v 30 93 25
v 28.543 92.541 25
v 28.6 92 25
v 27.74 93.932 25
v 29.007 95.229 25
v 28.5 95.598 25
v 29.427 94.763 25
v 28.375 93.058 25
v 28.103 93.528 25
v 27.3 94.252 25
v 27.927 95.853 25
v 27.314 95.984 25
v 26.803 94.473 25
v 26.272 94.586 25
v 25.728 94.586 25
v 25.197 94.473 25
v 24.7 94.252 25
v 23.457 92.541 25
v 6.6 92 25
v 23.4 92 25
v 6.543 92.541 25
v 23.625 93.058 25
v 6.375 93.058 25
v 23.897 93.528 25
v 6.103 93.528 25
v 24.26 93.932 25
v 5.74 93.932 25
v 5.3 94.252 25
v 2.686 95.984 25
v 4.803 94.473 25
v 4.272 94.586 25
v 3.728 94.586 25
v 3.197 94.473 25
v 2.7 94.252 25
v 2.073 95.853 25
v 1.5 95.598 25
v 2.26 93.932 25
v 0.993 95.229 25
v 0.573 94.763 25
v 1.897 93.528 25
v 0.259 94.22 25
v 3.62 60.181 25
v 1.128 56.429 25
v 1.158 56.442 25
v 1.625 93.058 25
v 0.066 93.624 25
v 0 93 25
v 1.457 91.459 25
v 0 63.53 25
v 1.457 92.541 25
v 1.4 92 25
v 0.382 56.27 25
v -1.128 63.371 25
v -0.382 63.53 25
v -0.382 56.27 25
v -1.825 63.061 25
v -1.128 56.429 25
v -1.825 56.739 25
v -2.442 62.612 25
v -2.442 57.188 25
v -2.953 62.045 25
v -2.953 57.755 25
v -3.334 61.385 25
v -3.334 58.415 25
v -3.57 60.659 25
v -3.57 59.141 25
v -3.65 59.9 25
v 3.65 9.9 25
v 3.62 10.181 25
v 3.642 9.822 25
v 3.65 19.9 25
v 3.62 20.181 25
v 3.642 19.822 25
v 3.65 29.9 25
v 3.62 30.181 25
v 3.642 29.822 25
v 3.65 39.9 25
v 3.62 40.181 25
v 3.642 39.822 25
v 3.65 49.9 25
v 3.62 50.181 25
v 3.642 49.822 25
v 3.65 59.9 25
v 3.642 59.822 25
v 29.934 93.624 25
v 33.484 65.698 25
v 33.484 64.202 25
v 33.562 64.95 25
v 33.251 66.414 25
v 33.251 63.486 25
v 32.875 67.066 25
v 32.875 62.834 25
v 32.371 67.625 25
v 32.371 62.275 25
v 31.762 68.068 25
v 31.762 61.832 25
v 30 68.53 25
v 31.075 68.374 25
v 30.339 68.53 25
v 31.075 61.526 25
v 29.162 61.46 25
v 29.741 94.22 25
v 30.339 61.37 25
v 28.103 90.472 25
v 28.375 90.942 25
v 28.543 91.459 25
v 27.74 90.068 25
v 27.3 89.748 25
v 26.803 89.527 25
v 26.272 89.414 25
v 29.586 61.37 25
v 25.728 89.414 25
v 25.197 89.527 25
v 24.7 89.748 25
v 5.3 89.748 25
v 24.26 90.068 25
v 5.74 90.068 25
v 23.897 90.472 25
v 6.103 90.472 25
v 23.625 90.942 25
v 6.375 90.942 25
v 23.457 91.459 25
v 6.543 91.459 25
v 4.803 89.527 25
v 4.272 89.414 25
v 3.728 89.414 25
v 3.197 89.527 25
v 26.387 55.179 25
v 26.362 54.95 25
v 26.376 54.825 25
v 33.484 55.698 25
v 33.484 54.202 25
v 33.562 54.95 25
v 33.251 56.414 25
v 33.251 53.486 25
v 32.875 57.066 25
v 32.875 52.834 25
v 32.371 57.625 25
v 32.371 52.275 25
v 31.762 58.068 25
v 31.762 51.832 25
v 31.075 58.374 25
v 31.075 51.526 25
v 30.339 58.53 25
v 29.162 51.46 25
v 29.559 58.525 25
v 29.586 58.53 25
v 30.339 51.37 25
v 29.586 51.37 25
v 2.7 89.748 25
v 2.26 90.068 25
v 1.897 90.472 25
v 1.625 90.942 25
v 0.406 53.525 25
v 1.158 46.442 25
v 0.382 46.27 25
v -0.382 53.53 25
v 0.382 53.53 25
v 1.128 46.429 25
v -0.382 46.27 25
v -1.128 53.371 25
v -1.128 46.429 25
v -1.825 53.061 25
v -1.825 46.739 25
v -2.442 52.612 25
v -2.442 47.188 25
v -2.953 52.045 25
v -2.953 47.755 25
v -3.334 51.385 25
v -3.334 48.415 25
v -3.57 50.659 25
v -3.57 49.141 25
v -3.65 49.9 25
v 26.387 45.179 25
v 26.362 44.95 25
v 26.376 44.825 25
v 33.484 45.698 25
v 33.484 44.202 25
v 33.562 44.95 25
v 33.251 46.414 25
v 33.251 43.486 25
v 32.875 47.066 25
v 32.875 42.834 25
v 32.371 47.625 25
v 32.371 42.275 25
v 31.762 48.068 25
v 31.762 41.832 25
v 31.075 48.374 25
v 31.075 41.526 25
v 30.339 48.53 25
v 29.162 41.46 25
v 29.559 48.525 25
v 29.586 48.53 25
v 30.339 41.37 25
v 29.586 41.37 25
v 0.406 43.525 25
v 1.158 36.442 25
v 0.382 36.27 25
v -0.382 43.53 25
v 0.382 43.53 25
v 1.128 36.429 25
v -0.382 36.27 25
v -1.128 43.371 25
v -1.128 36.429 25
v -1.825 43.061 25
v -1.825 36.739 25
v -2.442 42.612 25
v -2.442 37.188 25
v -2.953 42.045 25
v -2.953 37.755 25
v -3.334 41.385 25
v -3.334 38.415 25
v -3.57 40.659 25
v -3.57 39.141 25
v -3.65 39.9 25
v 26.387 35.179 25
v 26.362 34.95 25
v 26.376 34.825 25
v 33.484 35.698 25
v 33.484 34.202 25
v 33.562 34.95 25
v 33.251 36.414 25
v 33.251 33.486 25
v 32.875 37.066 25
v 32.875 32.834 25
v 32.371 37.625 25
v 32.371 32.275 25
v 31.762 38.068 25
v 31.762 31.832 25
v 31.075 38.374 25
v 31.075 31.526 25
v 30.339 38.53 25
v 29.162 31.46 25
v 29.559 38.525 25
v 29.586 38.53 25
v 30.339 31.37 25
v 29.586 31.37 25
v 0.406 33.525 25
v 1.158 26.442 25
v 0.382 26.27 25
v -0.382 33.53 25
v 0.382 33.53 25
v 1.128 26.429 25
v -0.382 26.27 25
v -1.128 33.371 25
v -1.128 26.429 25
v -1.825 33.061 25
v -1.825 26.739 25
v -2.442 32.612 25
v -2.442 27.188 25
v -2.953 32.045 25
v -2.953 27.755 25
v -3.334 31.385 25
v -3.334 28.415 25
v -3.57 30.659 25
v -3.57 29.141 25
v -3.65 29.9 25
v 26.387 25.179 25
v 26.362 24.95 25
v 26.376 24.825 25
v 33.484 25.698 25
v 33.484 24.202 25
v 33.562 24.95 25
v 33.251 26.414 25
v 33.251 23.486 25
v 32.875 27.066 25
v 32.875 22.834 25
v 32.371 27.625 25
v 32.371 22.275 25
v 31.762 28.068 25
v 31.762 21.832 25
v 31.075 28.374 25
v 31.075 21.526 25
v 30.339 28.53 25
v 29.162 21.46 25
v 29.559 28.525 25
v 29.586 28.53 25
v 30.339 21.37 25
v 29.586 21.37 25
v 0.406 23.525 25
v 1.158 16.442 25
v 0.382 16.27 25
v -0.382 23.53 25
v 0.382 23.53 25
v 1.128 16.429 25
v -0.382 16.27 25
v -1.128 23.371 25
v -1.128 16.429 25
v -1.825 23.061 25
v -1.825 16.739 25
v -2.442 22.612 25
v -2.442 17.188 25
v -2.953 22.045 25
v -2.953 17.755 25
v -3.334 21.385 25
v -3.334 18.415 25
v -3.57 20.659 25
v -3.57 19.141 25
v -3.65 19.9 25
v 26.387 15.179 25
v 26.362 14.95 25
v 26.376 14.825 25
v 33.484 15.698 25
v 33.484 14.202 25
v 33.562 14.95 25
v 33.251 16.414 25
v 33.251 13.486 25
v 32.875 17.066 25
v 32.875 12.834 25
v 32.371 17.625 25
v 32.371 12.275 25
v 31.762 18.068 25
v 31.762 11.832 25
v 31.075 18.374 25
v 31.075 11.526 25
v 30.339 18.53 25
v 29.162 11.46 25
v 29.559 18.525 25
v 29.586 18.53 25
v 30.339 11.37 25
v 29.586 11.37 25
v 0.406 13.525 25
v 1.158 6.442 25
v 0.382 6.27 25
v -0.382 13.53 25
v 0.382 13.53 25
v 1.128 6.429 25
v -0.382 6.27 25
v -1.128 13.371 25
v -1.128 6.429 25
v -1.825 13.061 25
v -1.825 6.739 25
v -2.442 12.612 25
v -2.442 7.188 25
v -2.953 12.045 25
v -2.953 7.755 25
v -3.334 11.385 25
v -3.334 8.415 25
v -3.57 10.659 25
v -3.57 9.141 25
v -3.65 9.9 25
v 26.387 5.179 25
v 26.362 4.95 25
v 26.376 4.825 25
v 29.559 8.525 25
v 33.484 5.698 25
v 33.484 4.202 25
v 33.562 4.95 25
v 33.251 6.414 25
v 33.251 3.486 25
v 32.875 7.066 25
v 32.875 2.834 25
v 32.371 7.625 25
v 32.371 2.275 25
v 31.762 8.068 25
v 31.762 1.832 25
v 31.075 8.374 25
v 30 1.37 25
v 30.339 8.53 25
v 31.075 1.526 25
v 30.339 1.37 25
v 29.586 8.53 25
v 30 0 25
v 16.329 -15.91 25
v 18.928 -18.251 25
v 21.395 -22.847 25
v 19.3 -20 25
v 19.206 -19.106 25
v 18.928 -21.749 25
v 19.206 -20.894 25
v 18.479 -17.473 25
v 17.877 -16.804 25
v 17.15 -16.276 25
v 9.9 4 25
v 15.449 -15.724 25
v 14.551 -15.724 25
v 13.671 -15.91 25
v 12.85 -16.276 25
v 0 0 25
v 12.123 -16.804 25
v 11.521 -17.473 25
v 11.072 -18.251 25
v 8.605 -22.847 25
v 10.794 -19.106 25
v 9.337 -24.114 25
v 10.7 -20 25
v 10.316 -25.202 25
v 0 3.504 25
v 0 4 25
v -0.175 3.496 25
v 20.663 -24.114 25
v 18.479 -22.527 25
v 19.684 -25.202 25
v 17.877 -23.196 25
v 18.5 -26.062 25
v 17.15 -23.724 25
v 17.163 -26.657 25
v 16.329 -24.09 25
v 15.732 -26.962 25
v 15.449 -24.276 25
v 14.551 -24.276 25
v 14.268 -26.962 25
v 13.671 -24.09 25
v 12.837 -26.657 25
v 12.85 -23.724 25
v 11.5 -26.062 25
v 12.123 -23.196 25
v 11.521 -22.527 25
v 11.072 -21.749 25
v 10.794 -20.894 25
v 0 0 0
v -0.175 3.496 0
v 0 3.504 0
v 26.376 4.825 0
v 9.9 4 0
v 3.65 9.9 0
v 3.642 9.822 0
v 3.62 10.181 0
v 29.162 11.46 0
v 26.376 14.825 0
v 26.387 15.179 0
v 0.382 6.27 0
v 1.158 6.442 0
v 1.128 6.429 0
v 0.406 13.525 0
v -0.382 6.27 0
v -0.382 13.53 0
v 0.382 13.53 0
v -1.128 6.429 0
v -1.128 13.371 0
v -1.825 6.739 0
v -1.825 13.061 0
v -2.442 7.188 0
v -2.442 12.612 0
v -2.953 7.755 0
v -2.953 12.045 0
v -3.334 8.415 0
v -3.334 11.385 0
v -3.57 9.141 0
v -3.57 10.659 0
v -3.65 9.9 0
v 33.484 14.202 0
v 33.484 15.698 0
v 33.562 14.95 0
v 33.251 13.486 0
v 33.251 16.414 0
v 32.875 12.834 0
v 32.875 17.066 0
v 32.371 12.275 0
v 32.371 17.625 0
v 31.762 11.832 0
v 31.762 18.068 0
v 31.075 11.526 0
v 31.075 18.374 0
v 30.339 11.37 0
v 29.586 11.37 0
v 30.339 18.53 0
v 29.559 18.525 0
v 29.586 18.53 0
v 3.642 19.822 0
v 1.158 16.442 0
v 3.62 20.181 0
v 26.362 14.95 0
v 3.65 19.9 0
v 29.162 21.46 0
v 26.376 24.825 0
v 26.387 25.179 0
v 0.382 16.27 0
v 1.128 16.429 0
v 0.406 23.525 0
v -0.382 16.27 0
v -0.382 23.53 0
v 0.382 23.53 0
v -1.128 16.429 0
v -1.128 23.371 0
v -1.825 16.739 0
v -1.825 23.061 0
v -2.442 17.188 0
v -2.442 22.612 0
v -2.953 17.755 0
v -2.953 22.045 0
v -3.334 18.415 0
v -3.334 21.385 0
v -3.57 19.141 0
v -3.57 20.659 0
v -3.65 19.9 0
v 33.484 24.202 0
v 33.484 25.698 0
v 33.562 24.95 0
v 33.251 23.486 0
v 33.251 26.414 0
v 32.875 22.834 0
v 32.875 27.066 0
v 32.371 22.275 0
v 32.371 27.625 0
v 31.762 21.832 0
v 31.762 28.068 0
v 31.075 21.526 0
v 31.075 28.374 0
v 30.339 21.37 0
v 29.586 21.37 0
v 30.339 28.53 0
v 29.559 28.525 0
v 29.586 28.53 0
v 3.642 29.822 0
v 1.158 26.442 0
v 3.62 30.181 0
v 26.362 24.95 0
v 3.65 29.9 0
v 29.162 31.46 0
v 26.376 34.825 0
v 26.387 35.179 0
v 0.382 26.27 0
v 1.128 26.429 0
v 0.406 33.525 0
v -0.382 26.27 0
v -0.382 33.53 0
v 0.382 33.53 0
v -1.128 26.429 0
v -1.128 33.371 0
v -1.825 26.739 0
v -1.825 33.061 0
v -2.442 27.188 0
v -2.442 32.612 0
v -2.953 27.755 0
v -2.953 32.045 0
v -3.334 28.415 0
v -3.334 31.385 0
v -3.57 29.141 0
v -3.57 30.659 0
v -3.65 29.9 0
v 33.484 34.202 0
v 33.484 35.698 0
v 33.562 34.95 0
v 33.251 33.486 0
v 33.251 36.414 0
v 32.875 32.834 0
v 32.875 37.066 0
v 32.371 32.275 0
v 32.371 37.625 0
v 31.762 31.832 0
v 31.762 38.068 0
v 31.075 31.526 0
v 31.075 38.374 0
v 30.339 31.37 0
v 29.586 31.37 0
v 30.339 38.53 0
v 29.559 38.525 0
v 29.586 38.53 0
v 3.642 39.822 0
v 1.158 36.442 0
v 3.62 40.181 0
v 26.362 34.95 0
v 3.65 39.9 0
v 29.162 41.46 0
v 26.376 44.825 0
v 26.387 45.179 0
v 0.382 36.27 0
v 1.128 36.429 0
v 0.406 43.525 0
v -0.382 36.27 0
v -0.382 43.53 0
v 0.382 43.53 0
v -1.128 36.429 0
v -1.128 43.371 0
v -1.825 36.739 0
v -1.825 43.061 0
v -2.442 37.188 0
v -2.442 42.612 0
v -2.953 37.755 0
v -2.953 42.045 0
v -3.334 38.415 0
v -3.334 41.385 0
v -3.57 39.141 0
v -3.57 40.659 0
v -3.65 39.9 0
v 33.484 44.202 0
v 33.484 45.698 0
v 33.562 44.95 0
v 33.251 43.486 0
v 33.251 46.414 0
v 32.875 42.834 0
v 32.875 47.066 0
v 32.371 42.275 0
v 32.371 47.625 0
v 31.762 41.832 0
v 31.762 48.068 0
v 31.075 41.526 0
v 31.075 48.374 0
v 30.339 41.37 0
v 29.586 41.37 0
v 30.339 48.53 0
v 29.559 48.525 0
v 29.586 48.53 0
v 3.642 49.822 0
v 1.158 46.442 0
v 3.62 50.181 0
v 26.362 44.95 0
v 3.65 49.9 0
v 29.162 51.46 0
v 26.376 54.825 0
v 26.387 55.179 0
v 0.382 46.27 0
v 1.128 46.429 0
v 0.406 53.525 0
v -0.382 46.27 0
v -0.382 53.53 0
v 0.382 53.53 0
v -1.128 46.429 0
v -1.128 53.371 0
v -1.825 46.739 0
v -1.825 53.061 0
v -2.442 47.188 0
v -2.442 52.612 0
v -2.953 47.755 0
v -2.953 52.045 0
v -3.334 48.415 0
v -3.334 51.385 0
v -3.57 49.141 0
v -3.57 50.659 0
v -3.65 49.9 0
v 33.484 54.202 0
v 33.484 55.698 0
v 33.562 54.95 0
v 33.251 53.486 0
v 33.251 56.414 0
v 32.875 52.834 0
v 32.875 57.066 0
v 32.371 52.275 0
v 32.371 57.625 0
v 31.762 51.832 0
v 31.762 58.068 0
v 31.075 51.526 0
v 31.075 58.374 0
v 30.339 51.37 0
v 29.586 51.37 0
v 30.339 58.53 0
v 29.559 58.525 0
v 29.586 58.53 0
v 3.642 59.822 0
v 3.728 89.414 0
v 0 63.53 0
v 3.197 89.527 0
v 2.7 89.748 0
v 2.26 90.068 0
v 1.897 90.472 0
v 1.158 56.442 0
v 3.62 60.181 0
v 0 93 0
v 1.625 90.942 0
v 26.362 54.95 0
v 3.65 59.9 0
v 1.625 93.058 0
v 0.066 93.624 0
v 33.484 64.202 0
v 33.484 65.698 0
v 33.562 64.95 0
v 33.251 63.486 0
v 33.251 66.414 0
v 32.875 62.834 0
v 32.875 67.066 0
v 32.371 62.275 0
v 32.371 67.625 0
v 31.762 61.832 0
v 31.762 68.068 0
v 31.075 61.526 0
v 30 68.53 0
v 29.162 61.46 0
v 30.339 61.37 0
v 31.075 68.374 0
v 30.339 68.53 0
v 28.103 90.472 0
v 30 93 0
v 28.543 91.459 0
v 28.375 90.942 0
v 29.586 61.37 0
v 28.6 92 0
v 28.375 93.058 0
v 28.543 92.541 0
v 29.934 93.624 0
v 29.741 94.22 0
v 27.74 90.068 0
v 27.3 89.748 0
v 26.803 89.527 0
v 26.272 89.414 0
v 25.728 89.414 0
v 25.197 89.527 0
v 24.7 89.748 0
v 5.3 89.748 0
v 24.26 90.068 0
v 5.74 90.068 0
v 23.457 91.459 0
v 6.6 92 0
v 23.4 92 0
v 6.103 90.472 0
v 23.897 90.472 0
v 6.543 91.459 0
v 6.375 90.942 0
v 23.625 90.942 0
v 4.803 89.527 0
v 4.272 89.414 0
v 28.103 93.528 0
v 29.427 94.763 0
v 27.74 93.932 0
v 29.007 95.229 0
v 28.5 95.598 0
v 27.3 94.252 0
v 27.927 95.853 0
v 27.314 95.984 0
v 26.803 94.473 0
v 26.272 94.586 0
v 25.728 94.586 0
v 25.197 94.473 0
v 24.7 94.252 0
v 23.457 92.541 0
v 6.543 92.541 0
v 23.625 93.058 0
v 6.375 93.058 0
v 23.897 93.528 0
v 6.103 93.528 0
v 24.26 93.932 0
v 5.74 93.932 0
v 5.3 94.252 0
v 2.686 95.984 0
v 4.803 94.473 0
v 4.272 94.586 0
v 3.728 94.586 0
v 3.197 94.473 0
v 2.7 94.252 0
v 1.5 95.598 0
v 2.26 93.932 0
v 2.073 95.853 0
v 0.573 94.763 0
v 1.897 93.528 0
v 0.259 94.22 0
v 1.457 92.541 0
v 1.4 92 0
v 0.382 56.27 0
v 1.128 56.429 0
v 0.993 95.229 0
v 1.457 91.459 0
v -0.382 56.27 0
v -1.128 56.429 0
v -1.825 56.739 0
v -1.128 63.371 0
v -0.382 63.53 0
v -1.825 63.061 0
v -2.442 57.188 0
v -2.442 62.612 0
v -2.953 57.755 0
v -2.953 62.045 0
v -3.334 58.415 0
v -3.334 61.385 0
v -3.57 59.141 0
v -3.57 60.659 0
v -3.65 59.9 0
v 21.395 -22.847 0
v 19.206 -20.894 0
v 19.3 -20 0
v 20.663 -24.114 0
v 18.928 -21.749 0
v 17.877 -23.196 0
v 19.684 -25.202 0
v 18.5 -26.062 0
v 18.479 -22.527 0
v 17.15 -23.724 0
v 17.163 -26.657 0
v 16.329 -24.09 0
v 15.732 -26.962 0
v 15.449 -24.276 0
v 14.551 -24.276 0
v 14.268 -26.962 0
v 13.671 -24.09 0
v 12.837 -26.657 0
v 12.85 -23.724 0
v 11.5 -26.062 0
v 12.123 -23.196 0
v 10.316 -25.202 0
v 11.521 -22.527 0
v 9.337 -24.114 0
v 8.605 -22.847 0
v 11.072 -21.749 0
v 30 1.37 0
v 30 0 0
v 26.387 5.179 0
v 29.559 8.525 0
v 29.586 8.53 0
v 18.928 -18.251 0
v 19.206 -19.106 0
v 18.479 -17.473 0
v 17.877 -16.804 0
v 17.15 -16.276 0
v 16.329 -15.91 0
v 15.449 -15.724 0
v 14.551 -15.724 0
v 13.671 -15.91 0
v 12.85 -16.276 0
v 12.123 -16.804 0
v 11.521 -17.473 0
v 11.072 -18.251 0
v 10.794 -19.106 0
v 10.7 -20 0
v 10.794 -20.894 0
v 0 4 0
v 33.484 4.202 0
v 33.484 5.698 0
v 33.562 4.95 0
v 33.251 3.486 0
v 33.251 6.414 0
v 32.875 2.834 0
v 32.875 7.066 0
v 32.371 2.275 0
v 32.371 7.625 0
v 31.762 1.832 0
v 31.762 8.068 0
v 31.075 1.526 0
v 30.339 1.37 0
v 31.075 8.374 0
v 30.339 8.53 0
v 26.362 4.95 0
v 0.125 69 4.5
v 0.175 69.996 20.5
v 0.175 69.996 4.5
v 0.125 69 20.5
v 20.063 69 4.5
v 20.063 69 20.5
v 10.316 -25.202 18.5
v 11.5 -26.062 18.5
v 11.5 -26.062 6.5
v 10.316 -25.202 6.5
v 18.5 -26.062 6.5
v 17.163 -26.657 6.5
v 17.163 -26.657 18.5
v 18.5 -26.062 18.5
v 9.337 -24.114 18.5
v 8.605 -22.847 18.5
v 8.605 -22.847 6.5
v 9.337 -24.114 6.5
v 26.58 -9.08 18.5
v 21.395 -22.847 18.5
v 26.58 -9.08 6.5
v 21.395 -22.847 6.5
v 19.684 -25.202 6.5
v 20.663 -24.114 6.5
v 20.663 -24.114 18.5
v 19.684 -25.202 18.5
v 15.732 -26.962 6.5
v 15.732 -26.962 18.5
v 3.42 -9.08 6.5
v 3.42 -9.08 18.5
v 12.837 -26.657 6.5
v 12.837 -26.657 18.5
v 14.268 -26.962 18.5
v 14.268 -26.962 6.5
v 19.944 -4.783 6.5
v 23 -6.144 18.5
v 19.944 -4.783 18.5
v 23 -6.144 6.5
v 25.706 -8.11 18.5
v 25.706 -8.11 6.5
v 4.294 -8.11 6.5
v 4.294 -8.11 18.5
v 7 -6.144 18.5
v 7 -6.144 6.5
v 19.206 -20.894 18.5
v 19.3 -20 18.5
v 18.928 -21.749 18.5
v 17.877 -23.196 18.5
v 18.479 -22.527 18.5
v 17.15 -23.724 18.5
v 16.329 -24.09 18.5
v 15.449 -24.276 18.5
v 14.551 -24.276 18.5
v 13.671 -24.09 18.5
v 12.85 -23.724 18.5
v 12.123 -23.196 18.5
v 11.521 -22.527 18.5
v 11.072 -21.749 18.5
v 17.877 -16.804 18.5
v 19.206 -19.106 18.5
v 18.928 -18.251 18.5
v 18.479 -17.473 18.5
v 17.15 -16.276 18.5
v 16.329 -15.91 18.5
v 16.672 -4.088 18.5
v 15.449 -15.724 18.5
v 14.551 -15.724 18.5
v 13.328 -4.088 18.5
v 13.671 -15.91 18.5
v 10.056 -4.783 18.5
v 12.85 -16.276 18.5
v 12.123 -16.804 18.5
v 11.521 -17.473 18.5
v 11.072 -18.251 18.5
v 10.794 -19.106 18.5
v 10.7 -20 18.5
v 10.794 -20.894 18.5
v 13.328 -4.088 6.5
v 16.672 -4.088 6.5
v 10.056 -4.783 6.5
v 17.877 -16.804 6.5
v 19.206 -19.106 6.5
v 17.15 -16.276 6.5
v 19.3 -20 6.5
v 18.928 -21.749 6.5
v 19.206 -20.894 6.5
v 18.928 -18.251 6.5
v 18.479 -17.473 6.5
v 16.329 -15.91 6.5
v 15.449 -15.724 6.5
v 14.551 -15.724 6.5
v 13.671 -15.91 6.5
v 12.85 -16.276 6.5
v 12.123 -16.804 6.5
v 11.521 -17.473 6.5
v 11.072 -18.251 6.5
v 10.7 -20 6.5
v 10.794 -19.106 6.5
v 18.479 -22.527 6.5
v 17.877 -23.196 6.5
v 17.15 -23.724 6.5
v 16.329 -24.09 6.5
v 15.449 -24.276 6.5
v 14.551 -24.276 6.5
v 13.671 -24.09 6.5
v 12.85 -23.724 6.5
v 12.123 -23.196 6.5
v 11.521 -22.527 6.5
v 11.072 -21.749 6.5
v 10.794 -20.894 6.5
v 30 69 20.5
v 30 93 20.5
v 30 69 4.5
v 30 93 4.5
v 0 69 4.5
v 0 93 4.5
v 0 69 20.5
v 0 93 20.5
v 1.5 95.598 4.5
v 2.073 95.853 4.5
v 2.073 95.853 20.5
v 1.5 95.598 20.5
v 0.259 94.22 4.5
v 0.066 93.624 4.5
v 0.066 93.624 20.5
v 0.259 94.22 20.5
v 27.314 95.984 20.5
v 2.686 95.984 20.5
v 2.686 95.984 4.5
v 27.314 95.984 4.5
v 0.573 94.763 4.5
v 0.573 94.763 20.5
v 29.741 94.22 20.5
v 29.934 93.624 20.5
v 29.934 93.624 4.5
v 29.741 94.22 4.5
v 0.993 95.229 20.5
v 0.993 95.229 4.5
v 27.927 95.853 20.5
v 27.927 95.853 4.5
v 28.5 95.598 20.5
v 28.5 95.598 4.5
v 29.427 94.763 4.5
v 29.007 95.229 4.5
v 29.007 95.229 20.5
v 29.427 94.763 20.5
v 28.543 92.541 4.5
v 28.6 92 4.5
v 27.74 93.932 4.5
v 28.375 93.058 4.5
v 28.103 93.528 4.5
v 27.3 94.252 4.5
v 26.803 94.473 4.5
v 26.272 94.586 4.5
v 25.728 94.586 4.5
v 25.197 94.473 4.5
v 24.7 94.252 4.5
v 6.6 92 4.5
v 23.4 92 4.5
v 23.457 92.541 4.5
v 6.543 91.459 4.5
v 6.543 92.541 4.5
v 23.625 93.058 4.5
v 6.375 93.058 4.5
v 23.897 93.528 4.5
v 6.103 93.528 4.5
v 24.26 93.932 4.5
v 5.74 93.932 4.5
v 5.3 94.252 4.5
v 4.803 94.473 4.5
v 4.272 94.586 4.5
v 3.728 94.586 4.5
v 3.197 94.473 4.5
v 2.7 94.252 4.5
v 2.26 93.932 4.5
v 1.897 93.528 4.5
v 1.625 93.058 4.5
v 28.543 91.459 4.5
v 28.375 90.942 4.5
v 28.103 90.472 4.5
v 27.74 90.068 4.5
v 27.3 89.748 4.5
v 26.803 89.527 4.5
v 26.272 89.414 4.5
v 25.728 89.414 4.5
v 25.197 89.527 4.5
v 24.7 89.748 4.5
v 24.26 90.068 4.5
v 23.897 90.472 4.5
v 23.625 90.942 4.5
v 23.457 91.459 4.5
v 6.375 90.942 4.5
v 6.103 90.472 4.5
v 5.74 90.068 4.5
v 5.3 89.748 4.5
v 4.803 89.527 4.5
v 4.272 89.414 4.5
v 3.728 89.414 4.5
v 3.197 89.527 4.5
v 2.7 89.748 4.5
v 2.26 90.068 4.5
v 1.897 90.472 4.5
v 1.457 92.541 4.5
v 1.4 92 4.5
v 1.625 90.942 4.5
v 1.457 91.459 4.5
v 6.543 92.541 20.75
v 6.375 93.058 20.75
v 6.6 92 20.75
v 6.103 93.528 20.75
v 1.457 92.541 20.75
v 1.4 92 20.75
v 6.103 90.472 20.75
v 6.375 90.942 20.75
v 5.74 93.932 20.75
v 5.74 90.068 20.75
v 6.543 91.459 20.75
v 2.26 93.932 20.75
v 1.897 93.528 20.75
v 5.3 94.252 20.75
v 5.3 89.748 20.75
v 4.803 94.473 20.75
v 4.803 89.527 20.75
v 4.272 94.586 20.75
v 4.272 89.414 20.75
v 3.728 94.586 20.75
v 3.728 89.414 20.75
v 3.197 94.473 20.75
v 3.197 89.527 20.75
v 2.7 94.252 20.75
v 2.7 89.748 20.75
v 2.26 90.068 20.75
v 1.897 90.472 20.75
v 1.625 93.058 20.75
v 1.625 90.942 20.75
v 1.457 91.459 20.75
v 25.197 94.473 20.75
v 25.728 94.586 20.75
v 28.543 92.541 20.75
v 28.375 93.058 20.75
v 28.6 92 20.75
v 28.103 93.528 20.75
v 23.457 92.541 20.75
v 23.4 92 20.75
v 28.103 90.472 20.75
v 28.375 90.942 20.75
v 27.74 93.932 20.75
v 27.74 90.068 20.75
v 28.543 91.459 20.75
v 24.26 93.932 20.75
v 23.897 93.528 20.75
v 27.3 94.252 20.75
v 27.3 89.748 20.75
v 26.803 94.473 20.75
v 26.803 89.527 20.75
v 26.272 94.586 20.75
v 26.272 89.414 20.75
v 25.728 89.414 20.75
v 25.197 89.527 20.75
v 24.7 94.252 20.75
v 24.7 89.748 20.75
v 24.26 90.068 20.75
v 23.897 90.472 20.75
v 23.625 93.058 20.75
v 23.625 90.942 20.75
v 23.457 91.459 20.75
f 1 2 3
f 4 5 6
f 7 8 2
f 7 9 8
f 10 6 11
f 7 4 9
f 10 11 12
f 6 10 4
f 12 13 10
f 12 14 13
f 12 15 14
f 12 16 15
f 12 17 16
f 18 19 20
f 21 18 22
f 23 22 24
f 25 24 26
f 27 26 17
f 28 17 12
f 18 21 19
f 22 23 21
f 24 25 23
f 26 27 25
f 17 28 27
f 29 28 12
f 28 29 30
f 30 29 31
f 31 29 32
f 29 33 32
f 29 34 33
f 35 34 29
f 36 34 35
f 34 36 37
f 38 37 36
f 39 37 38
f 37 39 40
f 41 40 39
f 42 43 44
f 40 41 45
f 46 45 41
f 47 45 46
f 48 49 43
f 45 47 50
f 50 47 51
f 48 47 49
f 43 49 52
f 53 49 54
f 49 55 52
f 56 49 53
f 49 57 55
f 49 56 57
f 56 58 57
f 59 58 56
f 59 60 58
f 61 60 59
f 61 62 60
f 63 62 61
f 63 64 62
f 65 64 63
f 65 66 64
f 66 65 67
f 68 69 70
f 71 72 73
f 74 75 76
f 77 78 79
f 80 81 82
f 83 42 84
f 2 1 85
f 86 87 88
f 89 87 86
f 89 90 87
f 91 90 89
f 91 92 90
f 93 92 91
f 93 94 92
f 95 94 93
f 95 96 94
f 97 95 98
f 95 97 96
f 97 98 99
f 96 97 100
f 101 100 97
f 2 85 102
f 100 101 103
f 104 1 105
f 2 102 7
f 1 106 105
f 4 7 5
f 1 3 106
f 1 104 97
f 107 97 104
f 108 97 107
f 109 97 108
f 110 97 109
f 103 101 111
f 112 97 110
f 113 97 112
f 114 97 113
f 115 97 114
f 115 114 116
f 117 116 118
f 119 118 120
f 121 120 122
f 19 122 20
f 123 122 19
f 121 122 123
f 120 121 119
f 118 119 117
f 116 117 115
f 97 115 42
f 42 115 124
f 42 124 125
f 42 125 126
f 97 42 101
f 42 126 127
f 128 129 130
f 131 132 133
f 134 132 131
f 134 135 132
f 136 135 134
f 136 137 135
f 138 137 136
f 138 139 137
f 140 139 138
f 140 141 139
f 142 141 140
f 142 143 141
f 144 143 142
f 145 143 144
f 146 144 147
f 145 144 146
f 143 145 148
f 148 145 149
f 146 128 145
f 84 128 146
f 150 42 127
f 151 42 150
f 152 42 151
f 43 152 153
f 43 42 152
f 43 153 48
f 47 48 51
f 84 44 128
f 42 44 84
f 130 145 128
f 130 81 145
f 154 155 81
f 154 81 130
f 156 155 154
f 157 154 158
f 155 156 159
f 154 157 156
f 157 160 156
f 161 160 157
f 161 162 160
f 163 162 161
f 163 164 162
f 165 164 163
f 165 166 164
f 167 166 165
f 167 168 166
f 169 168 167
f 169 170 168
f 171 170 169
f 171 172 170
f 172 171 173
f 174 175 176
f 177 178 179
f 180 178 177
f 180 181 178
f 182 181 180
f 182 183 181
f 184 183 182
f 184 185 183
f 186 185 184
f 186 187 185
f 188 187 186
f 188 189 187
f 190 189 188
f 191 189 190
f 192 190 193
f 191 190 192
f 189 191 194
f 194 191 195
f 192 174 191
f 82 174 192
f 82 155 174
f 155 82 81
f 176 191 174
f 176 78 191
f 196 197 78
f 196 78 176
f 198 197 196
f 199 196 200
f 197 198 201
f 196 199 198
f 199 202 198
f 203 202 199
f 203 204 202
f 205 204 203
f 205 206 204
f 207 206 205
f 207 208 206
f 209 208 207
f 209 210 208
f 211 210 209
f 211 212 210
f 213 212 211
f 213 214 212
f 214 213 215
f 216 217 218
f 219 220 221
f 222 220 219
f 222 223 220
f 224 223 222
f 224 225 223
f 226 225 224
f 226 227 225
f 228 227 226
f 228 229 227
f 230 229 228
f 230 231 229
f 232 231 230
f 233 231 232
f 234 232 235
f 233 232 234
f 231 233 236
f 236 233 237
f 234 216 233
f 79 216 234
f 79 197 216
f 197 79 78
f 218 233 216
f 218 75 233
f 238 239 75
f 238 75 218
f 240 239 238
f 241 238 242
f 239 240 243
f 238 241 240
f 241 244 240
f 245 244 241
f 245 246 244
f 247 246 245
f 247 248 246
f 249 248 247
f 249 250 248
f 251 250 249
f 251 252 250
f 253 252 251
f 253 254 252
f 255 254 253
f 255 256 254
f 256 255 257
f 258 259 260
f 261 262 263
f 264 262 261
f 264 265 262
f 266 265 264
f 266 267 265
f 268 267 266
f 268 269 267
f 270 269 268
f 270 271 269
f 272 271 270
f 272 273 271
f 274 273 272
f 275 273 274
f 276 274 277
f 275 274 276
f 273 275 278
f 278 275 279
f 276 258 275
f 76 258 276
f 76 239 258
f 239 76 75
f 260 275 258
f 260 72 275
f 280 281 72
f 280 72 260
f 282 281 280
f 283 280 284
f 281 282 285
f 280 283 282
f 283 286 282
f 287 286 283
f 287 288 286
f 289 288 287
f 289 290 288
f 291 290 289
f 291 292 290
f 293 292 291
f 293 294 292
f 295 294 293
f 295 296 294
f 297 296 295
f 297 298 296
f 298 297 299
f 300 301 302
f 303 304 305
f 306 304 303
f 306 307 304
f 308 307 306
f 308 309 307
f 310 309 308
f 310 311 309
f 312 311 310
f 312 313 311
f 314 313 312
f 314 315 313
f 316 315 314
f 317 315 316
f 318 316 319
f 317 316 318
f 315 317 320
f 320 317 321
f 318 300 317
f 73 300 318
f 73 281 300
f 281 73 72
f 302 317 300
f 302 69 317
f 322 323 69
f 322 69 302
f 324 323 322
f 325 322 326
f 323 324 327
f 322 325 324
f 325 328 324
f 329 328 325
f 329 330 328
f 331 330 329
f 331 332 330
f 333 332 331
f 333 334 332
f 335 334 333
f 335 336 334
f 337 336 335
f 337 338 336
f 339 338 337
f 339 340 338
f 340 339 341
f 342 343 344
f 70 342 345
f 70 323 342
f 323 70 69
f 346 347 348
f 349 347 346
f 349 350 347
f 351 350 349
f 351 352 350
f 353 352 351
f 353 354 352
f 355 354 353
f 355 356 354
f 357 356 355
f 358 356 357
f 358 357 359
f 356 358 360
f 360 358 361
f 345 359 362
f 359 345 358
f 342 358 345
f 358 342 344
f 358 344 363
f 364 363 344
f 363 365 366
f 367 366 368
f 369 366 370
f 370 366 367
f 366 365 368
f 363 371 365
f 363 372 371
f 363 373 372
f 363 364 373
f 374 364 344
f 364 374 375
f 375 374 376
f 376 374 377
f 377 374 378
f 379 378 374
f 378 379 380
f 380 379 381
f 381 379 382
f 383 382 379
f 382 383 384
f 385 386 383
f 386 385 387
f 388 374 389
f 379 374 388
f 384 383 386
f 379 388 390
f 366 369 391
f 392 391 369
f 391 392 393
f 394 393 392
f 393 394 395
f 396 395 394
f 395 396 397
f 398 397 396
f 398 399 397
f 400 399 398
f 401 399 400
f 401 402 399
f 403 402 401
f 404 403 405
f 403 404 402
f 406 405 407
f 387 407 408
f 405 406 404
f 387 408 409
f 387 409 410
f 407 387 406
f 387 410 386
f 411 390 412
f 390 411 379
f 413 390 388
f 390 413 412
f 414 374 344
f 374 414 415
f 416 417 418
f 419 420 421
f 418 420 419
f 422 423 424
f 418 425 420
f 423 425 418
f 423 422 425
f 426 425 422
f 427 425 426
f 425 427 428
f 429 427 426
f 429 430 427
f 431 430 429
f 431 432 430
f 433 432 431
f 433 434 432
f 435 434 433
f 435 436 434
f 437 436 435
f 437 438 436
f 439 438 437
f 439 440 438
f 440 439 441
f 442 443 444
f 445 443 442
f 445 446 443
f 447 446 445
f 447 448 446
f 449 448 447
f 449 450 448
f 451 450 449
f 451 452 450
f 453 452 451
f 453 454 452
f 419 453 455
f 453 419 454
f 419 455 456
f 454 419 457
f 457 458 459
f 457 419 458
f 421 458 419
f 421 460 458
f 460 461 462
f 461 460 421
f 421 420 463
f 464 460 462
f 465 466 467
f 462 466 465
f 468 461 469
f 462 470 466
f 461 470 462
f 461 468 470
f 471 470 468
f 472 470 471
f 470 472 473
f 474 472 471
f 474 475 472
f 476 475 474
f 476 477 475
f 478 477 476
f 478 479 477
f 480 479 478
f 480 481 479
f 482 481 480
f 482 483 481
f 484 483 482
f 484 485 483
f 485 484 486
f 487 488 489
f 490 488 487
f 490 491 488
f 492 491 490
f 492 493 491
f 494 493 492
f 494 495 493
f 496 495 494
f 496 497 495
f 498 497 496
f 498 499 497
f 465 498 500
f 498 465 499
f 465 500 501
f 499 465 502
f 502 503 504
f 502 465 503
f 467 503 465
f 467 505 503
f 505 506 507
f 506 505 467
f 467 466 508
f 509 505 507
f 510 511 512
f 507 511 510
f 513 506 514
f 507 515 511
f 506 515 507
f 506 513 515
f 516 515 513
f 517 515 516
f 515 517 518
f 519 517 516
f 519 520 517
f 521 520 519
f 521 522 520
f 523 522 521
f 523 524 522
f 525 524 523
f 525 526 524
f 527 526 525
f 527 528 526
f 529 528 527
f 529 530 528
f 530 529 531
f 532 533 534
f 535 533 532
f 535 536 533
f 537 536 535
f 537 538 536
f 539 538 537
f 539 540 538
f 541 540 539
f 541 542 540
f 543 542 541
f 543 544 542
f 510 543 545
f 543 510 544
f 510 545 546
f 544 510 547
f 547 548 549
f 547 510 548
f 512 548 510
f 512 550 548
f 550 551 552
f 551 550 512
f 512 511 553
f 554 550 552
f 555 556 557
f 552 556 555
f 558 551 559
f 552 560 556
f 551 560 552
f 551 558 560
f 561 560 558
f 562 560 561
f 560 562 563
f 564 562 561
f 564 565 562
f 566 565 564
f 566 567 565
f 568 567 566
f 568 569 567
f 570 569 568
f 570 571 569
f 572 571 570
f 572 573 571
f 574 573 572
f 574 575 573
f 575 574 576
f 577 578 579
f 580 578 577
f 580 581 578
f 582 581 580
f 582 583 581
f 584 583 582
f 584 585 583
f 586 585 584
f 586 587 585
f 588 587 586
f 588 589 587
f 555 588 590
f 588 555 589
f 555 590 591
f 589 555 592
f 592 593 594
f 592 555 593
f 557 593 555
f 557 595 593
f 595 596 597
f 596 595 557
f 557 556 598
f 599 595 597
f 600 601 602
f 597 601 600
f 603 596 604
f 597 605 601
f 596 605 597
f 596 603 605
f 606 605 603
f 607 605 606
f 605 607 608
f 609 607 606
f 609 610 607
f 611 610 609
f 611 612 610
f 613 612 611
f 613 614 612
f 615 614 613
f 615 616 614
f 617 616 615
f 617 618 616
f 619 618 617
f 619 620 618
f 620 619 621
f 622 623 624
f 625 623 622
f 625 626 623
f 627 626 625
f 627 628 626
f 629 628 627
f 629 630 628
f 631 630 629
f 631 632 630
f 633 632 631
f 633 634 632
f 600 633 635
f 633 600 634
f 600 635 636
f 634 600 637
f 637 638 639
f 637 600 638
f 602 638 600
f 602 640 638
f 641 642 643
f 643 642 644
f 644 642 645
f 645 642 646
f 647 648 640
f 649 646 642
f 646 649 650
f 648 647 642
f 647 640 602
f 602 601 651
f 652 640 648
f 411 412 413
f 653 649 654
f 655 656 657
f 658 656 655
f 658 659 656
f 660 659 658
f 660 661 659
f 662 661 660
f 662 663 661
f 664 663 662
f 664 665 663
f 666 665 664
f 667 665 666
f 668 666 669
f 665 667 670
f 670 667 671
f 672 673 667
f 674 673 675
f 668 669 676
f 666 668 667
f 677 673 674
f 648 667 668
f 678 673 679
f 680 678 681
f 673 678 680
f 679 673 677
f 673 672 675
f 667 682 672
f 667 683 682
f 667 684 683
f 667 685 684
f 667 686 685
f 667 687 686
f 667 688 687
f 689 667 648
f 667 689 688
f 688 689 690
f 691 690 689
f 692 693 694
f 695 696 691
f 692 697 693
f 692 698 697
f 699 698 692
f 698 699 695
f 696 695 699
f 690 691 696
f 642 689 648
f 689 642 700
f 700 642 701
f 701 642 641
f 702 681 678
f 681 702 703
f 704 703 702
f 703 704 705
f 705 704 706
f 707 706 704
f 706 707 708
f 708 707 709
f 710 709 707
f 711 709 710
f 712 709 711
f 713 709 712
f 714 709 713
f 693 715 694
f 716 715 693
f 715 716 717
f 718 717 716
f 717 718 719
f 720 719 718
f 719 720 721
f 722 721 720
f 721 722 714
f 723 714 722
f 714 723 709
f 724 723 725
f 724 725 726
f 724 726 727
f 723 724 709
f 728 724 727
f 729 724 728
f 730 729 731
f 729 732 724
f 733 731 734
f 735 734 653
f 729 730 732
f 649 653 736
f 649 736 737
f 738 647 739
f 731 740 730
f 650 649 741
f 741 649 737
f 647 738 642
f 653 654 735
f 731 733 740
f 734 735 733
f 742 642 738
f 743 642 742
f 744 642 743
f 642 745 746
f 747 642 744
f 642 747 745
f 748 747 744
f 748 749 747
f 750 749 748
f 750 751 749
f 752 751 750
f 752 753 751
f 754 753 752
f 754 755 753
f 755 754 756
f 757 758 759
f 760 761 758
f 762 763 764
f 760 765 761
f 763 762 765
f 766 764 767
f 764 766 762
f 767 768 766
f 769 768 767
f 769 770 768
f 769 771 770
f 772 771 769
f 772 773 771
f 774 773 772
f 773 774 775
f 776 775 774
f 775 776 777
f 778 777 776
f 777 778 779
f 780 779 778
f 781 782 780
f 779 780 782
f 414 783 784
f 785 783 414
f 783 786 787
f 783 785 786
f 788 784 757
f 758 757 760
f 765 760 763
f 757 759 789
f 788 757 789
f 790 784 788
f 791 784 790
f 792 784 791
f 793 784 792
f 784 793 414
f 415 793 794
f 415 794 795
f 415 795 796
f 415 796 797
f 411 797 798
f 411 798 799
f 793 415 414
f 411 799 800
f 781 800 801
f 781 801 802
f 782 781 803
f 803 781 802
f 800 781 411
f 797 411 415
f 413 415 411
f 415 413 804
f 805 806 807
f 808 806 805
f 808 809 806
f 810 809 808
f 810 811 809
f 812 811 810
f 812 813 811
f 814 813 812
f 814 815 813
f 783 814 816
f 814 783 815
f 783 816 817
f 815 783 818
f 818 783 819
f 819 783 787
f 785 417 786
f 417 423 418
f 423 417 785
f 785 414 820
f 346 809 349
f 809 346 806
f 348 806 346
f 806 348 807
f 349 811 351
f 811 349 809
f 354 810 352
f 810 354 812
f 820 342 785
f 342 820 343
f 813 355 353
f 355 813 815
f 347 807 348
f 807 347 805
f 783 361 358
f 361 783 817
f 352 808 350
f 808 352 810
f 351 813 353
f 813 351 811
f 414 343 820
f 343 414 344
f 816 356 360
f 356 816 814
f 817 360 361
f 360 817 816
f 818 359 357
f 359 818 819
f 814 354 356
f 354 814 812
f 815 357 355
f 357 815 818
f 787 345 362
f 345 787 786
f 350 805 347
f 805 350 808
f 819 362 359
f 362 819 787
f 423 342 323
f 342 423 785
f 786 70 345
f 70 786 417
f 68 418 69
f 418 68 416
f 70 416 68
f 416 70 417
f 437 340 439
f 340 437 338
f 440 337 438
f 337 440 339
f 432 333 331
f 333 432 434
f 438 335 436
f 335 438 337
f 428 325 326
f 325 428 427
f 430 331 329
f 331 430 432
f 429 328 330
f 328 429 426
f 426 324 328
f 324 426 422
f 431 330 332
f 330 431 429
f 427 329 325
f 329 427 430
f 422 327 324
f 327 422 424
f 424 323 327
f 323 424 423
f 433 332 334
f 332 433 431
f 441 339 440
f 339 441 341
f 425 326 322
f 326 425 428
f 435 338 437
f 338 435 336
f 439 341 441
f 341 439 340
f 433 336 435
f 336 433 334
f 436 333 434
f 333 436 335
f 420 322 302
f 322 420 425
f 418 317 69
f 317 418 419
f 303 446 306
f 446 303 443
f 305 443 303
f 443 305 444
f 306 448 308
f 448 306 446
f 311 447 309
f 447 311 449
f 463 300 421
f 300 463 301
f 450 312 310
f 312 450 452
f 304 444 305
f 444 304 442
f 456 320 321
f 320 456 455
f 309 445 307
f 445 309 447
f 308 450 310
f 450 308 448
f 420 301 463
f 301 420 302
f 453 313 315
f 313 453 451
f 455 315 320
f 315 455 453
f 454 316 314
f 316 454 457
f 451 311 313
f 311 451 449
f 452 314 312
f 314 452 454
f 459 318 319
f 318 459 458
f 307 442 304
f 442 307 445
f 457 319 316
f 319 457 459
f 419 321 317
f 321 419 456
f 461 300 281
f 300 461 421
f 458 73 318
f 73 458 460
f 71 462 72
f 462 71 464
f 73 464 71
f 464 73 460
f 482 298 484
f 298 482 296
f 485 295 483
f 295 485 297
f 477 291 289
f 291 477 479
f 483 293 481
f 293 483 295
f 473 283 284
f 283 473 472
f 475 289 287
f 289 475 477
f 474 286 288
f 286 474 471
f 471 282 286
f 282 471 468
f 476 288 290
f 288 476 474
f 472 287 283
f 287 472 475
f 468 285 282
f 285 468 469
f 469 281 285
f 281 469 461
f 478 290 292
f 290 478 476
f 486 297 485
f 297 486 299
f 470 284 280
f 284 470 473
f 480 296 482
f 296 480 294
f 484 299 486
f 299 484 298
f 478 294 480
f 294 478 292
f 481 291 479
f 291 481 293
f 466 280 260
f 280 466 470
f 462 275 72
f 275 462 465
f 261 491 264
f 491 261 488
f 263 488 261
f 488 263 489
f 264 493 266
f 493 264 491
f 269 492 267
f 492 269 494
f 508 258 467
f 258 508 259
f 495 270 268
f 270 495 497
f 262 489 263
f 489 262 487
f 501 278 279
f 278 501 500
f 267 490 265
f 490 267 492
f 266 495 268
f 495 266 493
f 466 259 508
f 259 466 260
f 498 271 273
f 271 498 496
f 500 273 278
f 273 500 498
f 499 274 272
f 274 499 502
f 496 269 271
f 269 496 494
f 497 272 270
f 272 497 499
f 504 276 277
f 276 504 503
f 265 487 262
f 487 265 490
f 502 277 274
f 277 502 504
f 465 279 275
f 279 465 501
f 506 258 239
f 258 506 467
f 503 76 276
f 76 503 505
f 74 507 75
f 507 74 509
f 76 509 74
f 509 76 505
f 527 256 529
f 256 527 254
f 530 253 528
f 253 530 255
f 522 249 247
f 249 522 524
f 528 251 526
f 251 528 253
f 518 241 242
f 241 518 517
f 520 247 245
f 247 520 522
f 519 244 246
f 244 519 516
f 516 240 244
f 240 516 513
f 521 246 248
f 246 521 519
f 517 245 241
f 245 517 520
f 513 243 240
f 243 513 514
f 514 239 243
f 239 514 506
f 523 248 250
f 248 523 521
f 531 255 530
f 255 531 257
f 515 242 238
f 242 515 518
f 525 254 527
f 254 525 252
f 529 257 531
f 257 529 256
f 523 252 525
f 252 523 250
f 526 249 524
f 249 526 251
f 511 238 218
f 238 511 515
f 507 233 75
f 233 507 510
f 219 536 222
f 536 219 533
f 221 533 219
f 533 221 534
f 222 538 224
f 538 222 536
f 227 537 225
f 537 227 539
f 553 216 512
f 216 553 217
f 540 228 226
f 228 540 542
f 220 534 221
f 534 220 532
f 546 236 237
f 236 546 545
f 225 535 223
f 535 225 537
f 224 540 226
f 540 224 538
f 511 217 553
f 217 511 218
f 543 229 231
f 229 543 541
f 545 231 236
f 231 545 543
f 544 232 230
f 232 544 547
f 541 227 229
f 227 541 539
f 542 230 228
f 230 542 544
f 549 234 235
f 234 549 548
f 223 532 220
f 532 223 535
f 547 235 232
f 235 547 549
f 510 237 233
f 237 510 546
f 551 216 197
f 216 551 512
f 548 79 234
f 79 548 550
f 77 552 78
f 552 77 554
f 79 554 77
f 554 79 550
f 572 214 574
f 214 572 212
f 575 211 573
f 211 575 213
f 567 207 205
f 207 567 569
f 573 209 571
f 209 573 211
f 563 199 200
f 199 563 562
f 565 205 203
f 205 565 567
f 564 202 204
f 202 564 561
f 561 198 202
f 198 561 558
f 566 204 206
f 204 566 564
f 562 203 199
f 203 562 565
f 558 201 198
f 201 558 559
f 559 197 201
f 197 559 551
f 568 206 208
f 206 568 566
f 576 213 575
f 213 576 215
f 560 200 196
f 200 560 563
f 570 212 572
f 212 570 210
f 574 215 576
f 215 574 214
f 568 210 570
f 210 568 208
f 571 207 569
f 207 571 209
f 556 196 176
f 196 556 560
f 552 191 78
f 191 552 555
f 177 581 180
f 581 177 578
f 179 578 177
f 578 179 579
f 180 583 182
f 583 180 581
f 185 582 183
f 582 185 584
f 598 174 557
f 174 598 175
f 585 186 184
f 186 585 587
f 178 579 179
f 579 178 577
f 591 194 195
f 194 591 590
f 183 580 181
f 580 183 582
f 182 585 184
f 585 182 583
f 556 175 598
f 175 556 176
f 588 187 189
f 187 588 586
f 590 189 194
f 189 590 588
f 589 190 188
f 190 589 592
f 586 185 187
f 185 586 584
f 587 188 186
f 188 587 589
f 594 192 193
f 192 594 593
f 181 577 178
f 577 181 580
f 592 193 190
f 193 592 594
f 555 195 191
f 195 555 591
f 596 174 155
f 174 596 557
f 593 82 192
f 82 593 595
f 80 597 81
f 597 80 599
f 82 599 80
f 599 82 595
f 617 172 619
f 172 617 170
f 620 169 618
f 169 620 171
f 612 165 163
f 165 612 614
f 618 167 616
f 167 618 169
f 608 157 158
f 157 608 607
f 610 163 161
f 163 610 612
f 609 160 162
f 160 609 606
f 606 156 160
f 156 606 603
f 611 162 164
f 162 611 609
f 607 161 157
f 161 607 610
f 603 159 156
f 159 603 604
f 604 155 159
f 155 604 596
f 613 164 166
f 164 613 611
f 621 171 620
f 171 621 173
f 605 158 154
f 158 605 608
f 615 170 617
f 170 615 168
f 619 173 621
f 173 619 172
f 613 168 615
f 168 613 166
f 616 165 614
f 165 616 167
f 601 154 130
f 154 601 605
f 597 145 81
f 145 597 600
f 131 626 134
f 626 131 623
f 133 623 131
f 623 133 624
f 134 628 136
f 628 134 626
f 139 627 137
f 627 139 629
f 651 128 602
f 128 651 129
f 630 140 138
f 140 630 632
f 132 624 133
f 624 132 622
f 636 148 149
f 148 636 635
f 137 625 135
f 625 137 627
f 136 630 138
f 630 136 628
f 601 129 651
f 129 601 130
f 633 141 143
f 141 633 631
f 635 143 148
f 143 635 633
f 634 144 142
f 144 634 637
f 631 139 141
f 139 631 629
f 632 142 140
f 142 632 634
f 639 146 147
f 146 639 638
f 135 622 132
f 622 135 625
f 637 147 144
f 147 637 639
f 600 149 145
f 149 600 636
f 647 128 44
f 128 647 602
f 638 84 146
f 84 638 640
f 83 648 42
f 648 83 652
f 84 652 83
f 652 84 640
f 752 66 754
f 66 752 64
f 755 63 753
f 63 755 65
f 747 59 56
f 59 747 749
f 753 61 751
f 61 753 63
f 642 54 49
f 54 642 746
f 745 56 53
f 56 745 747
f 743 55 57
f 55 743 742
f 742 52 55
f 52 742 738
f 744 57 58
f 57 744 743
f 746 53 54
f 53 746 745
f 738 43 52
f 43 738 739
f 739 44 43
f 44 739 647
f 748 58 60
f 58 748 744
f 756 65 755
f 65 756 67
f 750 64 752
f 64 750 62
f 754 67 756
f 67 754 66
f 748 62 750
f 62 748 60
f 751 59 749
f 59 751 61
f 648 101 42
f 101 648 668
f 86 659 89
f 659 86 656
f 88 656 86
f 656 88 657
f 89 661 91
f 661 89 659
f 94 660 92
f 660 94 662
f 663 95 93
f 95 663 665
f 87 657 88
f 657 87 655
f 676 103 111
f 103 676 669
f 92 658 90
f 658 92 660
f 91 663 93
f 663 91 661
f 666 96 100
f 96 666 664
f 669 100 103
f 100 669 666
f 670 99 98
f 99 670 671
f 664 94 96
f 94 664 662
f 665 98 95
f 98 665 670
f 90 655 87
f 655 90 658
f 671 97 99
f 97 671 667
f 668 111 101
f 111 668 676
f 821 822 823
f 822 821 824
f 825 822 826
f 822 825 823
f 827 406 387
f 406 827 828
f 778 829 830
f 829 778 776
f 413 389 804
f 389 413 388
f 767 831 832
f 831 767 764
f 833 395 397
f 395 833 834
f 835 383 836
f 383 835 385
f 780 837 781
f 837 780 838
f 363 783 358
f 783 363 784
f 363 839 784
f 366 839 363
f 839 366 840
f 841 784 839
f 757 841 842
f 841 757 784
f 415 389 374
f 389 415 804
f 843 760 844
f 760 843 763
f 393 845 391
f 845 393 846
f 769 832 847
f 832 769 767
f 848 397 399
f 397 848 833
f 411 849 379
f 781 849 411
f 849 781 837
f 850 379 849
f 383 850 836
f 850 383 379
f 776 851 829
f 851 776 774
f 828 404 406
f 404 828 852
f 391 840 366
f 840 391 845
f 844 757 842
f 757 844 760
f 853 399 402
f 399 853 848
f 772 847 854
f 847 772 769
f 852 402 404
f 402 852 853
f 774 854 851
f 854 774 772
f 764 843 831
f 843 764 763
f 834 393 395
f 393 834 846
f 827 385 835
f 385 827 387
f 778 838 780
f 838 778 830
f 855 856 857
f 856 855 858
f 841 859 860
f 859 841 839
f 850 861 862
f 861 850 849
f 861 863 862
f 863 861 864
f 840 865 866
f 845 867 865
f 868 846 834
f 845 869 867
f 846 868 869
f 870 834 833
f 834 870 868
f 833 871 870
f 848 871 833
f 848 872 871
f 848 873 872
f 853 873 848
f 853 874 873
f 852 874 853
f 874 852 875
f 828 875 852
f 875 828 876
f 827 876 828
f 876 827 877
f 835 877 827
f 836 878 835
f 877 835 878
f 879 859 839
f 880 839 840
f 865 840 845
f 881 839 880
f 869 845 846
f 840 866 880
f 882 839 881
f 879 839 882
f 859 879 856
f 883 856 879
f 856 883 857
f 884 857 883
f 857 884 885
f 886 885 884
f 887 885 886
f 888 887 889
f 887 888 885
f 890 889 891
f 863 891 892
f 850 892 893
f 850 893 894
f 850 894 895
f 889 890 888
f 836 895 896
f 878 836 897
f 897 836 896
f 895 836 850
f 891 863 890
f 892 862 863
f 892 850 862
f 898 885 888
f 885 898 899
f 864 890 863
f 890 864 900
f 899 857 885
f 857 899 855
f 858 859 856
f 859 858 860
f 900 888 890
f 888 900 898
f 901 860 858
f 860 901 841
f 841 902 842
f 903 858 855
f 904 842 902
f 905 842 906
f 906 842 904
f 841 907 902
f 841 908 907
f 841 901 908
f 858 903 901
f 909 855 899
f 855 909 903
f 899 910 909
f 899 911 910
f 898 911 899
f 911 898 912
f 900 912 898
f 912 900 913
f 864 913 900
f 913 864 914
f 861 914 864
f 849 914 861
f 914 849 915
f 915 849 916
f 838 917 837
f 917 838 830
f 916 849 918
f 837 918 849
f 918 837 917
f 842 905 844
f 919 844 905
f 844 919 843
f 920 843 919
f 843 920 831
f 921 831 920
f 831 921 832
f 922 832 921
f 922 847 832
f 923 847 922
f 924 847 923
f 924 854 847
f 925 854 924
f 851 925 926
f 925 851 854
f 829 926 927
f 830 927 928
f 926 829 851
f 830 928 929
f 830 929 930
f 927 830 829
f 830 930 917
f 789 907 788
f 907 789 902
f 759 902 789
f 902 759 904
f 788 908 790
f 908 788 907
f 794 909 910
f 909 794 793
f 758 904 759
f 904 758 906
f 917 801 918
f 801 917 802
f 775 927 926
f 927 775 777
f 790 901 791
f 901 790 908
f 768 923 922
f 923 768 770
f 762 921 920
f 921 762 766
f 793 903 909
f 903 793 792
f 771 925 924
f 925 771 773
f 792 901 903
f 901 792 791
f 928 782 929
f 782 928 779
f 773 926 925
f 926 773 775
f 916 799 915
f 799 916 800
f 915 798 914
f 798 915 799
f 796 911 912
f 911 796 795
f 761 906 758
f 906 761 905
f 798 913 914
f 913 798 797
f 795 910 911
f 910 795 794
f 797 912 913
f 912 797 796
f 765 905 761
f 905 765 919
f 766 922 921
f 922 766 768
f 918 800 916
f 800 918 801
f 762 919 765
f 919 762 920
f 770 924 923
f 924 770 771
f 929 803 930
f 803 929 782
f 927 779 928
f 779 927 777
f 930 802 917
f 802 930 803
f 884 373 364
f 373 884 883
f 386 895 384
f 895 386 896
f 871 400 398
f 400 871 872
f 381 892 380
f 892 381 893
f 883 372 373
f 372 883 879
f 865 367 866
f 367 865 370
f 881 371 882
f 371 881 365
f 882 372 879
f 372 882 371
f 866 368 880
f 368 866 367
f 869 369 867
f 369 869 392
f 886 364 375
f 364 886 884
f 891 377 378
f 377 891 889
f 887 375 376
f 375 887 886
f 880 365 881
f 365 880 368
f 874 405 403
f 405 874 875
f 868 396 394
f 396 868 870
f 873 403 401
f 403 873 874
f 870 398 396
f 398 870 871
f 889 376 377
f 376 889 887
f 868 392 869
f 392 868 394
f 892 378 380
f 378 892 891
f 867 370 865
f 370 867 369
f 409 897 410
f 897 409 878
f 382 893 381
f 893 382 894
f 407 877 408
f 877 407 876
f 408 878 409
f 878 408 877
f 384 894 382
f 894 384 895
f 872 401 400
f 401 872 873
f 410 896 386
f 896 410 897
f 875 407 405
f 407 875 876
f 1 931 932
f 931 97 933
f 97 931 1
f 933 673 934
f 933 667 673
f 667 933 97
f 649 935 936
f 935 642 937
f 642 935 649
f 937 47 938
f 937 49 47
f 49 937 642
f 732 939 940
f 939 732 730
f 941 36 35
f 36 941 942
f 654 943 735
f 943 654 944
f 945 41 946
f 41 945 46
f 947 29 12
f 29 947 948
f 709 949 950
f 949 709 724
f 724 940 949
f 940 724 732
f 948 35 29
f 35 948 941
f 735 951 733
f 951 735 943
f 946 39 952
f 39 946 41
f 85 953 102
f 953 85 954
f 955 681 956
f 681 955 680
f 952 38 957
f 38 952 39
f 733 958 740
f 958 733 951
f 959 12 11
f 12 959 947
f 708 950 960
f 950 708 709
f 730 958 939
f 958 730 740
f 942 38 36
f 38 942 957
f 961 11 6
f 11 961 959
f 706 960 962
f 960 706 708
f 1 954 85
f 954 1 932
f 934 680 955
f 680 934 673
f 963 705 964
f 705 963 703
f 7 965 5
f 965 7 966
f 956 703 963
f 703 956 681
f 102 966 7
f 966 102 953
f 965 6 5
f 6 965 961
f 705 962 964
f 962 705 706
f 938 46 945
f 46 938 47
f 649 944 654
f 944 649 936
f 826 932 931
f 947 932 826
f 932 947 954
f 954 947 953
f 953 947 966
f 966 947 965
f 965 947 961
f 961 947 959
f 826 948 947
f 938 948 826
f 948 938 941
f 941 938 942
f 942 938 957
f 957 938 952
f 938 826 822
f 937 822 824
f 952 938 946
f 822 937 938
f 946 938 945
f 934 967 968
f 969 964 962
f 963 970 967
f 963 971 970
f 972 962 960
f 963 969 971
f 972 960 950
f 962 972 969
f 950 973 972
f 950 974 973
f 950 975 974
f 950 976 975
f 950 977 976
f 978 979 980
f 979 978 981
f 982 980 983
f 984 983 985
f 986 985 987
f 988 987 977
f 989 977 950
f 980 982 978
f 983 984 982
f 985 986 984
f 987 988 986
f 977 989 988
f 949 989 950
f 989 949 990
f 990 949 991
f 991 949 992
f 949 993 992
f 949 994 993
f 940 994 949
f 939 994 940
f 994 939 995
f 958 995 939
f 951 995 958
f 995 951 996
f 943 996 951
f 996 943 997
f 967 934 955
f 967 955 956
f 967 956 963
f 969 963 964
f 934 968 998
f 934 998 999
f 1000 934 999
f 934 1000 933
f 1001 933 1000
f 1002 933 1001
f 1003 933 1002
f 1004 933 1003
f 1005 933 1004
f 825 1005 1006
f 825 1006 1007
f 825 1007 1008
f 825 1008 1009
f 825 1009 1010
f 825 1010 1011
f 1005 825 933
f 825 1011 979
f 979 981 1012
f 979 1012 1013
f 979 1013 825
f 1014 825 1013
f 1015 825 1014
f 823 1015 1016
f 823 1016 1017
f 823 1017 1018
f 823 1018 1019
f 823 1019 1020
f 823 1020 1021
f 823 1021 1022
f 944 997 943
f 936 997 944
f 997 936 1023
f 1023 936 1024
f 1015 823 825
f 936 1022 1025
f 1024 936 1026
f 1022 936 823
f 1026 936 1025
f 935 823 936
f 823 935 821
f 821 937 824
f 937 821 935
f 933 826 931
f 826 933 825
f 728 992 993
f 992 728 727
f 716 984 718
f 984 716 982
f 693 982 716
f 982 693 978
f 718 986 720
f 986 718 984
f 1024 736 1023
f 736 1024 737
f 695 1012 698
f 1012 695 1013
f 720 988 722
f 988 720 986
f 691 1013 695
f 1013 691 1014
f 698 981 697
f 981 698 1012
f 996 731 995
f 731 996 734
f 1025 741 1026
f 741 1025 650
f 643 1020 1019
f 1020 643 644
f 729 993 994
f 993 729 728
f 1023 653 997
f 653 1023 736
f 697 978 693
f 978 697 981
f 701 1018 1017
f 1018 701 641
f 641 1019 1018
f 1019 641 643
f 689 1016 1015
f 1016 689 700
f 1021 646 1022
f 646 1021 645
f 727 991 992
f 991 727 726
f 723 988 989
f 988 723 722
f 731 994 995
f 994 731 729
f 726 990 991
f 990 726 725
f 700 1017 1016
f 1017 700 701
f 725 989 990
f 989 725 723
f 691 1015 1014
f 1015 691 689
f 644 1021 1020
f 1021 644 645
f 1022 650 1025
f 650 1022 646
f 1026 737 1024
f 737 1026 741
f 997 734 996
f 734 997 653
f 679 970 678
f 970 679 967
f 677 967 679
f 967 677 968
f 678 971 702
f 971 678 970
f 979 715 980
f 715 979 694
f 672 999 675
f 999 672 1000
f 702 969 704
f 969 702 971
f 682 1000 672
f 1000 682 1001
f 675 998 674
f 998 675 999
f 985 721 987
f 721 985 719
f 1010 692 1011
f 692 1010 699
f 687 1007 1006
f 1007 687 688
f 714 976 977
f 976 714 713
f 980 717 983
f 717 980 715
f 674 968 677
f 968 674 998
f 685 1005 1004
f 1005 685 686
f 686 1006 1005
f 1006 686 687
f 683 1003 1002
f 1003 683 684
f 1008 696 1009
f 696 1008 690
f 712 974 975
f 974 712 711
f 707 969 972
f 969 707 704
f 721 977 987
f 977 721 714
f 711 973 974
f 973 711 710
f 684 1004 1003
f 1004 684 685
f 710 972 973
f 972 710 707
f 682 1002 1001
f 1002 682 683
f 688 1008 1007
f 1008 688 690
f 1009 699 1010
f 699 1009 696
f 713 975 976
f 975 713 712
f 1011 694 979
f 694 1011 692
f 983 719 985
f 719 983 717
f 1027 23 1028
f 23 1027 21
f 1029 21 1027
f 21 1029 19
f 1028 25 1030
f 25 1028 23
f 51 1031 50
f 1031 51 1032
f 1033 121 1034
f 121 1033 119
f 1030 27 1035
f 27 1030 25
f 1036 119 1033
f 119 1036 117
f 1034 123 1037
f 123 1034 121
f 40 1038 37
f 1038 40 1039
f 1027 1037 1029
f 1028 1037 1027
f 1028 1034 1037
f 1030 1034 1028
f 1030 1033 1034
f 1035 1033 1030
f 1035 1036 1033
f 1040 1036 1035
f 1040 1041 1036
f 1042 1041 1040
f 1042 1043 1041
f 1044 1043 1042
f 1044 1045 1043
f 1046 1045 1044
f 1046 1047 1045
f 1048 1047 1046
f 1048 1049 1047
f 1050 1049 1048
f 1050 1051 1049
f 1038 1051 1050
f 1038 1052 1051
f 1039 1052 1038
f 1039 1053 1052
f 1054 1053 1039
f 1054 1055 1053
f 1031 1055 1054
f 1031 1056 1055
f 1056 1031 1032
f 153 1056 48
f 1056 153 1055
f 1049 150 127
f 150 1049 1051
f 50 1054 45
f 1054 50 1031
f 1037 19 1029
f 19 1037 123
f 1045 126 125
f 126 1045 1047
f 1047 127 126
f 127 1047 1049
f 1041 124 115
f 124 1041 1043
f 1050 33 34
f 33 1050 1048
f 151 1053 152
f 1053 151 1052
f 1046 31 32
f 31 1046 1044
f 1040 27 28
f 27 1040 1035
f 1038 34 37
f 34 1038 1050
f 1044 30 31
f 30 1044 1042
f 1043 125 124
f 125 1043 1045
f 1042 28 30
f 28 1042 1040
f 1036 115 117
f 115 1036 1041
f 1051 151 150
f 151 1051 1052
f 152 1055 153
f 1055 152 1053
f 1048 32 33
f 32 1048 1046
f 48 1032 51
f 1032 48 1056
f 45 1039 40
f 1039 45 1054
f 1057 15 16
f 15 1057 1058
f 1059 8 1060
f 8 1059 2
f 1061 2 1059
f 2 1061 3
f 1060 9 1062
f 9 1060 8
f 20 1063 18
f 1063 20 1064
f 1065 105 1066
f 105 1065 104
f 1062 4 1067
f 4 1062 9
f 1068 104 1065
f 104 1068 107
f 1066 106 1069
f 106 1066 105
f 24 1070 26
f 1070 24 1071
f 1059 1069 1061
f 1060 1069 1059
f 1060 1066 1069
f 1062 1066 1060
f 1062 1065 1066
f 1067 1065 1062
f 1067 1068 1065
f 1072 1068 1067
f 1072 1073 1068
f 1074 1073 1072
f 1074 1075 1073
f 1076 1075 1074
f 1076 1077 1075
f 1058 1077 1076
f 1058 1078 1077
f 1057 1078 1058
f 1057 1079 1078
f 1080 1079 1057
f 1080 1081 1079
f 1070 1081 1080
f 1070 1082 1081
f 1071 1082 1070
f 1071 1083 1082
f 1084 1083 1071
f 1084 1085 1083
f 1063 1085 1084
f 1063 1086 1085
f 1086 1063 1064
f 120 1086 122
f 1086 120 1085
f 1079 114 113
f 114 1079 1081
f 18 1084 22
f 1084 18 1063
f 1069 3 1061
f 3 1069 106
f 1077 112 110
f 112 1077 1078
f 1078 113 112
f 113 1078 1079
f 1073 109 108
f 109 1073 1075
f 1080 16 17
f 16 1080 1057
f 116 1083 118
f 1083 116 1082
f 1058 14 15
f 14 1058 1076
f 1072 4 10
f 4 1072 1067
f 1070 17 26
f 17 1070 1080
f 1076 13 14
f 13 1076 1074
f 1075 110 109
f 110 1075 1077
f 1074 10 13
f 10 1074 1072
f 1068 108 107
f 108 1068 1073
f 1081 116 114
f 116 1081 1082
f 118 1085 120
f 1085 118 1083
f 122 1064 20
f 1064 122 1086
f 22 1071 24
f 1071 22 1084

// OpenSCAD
$fn = 30;

module spring(w = 30, h = 25, d = 1.5, sth = 3.5, th=25, n=6)
{
  a = asin(d/w);

  module spring_part(i=0)
  {
  rotate([0,0,a])
  cube([w,sth,th]);
  translate([w*cos(a),h*sin(a)+sth+.2,0])
  cylinder(d=sth*2+.2,h=th);

  translate([w*cos(a),w*sin(a)+sth,0])
  mirror([1,0,0])
  rotate([0,0,a])
  cube([w,sth,th]);
  
  if(i!=n)
  {
  translate([0*w*cos(a),2*(h*sin(a)+sth+.2),0])
  cylinder(d=sth*2+.3,h=th);
  }
  }

  for(i=[0:n])
  {  
    translate([0,i*(2*w*sin(a) + sth*2),0])
    spring_part(i);  
 
  }
  
}

module pulley_holder(w=30, th=25)
{

  difference()
  {
  hull()
  {
  cube([w,4,th]);
  translate([w/2,-20,0])
  cylinder(r=7, h=th);
  }

  translate([w/2,-20, 6.5])
  cylinder(r=16, h=12);

  translate([w/2,-20, -1])
  cylinder(r=4.3, h=12);

  //upper hole
  translate([w/2,-20, 18.25])
  cylinder(r=4.3, h=120);
  }

}

module clamp(l=30, w=30, th=25)
{
  difference()
  {
  union()
  {
  cube([w,l,th]);
  hull()
  {
  translate([3,l,0])
  cylinder(r=3, h=th);
  translate([w-3,l,0])
  cylinder(r=3, h=th);
  }
  }

  translate([-1,3 + 3,4.5])
  cube([w+2,l,16]);


  translate([4,l-1,-1])
  cylinder(r=2.6, h=15);

  translate([w-4,l-1,-1])
  cylinder(r=2.6, h=15);

  //upper holes
  translate([4,l-1,20.75])
  cylinder(r=2.6, h=15);

  translate([w-4,l-1,20.75])
  cylinder(r=2.6, h=15);
  }

}


spring();
pulley_holder();
translate([0,63,0])
clamp();
